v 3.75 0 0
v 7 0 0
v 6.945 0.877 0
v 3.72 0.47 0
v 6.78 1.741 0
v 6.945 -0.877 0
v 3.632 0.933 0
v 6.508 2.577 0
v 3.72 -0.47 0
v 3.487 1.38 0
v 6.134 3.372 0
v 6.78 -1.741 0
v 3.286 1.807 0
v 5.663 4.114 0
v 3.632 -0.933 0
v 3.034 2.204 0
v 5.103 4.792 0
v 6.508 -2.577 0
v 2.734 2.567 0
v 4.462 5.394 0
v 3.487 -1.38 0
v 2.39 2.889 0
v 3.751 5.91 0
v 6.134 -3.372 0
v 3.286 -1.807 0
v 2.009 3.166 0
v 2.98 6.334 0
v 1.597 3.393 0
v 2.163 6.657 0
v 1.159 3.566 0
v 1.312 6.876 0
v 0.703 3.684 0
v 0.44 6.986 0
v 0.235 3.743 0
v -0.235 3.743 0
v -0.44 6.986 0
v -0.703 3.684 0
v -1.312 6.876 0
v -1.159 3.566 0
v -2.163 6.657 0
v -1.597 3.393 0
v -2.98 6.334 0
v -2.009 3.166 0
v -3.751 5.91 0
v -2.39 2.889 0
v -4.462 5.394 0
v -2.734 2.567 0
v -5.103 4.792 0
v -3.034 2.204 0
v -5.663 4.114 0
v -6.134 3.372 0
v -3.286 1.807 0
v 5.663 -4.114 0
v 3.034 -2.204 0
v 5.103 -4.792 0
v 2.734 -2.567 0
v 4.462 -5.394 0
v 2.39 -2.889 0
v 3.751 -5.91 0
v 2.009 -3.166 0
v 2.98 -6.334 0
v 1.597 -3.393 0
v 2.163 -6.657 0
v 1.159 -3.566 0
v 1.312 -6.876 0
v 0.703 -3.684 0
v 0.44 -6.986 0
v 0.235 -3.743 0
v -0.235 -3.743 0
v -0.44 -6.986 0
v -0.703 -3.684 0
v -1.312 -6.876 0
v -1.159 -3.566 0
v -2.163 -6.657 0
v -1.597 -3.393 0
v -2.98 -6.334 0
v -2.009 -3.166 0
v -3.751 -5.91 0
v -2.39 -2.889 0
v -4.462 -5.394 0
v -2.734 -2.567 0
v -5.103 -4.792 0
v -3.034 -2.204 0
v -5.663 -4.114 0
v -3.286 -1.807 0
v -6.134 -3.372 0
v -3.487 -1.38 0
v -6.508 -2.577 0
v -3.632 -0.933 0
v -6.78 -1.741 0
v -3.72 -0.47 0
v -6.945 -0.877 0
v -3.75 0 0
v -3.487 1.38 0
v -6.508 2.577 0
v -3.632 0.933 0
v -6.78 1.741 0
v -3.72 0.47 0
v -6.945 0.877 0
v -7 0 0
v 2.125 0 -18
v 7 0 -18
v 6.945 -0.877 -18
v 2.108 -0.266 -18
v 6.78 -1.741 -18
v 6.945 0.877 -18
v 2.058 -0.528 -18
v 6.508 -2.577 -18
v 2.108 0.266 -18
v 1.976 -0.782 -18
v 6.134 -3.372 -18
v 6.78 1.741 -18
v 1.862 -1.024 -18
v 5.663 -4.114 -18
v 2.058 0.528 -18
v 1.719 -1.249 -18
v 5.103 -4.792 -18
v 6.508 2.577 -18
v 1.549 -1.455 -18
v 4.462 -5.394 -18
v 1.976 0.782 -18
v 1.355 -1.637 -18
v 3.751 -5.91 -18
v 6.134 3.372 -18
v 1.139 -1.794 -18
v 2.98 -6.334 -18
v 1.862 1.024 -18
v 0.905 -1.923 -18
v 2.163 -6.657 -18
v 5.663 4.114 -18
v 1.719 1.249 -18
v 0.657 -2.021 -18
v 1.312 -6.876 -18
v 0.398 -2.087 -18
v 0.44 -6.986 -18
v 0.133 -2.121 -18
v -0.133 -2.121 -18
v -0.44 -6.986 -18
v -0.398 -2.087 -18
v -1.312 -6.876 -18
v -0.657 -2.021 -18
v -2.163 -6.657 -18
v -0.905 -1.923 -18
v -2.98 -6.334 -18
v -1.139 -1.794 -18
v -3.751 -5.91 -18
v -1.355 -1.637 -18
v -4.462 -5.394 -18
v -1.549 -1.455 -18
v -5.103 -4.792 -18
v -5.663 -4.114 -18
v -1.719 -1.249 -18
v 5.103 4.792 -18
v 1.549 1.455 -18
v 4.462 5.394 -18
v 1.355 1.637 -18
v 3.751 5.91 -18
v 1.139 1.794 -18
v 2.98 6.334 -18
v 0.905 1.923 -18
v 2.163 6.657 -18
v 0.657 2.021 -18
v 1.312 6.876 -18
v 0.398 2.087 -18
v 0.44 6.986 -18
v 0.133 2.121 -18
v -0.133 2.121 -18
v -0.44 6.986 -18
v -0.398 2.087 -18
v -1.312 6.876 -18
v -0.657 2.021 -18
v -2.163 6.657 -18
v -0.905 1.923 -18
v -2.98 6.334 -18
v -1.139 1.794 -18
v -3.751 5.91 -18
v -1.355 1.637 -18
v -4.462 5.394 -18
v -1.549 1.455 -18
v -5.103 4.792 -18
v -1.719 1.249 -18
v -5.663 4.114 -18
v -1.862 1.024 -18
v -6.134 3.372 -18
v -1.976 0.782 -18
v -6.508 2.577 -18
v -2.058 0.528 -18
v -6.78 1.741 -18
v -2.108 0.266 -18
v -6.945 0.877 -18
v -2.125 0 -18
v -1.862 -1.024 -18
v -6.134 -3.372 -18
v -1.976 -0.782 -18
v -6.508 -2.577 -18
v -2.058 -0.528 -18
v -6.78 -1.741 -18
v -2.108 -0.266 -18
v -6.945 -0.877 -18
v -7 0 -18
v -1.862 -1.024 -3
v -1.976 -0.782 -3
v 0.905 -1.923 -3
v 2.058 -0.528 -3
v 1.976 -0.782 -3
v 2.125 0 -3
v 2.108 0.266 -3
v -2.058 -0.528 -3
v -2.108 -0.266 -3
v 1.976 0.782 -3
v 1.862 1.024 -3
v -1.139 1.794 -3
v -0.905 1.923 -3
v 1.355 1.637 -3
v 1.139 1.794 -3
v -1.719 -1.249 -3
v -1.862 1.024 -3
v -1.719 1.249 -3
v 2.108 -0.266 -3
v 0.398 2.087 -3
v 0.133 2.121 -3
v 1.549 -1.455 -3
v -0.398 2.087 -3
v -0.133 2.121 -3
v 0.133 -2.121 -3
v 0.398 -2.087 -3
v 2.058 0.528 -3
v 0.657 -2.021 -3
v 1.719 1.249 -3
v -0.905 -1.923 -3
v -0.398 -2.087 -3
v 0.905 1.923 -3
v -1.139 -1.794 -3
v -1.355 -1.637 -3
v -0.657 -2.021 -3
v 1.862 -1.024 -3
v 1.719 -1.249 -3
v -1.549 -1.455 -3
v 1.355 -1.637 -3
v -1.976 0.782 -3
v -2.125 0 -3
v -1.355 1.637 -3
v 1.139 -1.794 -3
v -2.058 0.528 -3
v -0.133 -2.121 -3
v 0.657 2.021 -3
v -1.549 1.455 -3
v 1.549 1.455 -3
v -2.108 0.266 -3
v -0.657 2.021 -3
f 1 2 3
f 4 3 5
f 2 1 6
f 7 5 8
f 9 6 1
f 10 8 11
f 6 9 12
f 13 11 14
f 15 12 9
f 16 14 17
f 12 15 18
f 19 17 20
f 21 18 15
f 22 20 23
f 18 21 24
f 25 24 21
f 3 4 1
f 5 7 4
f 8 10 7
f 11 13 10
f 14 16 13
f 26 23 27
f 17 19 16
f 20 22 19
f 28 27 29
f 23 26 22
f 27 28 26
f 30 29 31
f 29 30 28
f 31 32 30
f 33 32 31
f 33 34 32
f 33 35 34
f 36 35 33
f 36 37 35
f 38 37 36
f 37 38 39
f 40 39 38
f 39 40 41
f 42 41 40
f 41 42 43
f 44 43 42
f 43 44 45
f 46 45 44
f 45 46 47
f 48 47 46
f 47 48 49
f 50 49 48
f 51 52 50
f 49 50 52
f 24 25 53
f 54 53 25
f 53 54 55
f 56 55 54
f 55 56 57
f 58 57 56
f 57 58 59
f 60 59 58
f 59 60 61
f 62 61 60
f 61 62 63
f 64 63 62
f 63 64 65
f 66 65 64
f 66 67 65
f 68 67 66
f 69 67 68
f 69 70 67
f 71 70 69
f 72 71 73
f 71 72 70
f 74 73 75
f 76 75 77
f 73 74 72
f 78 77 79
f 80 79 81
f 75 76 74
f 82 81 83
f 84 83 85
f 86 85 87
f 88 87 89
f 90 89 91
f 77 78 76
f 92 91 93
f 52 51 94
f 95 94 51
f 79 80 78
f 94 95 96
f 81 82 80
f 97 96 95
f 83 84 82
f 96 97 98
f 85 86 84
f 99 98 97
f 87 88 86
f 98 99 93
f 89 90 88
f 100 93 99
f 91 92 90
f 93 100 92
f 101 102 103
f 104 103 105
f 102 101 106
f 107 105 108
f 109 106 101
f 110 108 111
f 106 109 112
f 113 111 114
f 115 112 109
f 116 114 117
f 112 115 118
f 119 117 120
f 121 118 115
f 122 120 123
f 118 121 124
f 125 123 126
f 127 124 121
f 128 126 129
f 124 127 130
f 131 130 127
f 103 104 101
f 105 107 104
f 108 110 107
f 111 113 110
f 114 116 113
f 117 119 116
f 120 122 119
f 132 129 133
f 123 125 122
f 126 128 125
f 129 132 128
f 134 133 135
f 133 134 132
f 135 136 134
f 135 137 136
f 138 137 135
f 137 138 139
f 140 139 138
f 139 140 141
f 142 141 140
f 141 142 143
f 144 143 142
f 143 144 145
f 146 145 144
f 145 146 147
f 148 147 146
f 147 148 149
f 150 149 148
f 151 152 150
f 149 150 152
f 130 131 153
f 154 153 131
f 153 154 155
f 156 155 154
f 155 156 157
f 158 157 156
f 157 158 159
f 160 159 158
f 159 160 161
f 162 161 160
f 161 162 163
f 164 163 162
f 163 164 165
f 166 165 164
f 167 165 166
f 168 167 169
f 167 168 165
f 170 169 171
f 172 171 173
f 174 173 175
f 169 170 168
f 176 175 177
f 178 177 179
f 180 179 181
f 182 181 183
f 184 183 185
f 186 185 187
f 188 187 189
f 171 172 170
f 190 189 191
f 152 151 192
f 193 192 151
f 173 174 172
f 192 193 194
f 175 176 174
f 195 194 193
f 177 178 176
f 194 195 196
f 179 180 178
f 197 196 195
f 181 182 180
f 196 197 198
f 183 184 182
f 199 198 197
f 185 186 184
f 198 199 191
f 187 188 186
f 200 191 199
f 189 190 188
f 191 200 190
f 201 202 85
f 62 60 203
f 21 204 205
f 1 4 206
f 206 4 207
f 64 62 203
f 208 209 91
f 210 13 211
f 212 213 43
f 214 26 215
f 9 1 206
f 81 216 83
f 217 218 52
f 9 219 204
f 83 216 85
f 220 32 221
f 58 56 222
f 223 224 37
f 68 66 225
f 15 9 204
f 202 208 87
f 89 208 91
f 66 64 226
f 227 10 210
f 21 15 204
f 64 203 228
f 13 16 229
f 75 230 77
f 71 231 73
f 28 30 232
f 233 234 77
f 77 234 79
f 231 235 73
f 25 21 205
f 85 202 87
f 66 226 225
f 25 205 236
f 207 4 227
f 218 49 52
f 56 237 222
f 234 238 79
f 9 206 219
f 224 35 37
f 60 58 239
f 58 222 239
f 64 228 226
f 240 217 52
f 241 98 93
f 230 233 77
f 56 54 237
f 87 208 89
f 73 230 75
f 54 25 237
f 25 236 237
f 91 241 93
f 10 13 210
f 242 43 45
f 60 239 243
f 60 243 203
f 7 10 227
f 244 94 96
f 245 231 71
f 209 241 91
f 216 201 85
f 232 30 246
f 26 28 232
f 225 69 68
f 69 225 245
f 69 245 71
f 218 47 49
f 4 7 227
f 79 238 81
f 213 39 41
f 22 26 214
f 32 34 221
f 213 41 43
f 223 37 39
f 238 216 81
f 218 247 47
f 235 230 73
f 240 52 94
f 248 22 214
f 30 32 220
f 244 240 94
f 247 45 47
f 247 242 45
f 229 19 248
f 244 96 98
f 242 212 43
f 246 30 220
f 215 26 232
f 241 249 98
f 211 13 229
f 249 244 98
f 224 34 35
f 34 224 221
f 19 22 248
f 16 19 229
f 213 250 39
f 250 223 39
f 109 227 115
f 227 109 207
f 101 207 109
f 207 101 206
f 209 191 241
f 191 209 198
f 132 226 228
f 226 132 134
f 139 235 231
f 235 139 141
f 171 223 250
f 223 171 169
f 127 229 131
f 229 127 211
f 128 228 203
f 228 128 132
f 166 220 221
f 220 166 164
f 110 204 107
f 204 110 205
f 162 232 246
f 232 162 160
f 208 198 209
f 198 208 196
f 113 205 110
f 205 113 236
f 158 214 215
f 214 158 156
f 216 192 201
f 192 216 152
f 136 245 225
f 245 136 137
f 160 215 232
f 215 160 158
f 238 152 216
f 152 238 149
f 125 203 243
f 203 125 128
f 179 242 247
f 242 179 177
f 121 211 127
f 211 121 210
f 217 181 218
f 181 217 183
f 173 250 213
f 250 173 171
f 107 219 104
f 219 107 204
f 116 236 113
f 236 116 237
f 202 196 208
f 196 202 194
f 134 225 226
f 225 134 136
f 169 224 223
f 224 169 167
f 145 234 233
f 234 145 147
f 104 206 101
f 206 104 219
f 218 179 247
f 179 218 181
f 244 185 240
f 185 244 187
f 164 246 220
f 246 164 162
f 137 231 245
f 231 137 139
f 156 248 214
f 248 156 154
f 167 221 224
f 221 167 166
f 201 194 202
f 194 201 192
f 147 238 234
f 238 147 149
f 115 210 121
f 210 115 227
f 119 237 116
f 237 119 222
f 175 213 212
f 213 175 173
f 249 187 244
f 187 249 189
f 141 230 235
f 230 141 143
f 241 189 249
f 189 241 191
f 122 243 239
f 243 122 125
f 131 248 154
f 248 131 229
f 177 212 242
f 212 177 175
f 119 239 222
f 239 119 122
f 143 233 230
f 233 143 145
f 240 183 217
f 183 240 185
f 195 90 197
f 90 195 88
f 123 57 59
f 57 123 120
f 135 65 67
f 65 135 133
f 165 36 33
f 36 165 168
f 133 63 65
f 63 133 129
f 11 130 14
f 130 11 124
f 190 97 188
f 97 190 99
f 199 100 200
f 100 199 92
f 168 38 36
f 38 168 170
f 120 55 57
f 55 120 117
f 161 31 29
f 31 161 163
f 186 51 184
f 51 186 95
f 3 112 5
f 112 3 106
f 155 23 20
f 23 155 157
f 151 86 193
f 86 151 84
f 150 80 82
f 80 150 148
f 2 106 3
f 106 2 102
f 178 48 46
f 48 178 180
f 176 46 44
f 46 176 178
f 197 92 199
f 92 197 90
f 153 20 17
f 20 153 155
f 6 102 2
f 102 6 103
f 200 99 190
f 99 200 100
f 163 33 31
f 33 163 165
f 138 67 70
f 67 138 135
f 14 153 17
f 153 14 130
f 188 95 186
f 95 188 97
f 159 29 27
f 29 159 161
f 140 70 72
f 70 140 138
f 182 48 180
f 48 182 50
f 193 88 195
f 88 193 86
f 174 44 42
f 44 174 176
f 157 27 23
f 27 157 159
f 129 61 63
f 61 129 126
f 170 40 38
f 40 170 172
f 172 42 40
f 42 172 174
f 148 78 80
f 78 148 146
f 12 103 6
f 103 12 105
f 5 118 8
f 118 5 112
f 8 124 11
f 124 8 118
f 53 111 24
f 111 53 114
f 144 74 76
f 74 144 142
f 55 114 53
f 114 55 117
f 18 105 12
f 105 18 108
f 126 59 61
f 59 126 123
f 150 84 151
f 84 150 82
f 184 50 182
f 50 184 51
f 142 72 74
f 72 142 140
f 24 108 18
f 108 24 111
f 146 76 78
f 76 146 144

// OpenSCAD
$fn = 50;


difference() {
	union() {
		translate(v = [0, 0, -18.0000000000]) {
			cylinder(h = 18, r = 7.0000000000);
		}
		cylinder(h = 0, r = 17.0000000000);
	}
	union() {
		translate(v = [0, 0, 0]) {
			rotate(a = [0, 0, 0]) {
				difference() {
					union() {
						#translate(v = [0, 0, -18.0000000000]) {
							cylinder(h = 18, r = 2.0000000000);
						}
						#translate(v = [0, 0, -3]) {
							cylinder(h = 3, r1 = 2.1250000000, r2 = 3.7500000000);
						}
						#translate(v = [0, 0, -18.0000000000]) {
							cylinder(h = 18, r = 2.1250000000);
						}
						#translate(v = [0, 0, -18.0000000000]) {
							cylinder(h = 18, r = 2.0000000000);
						}
					}
					union();
				}
			}
		}
	}
}
